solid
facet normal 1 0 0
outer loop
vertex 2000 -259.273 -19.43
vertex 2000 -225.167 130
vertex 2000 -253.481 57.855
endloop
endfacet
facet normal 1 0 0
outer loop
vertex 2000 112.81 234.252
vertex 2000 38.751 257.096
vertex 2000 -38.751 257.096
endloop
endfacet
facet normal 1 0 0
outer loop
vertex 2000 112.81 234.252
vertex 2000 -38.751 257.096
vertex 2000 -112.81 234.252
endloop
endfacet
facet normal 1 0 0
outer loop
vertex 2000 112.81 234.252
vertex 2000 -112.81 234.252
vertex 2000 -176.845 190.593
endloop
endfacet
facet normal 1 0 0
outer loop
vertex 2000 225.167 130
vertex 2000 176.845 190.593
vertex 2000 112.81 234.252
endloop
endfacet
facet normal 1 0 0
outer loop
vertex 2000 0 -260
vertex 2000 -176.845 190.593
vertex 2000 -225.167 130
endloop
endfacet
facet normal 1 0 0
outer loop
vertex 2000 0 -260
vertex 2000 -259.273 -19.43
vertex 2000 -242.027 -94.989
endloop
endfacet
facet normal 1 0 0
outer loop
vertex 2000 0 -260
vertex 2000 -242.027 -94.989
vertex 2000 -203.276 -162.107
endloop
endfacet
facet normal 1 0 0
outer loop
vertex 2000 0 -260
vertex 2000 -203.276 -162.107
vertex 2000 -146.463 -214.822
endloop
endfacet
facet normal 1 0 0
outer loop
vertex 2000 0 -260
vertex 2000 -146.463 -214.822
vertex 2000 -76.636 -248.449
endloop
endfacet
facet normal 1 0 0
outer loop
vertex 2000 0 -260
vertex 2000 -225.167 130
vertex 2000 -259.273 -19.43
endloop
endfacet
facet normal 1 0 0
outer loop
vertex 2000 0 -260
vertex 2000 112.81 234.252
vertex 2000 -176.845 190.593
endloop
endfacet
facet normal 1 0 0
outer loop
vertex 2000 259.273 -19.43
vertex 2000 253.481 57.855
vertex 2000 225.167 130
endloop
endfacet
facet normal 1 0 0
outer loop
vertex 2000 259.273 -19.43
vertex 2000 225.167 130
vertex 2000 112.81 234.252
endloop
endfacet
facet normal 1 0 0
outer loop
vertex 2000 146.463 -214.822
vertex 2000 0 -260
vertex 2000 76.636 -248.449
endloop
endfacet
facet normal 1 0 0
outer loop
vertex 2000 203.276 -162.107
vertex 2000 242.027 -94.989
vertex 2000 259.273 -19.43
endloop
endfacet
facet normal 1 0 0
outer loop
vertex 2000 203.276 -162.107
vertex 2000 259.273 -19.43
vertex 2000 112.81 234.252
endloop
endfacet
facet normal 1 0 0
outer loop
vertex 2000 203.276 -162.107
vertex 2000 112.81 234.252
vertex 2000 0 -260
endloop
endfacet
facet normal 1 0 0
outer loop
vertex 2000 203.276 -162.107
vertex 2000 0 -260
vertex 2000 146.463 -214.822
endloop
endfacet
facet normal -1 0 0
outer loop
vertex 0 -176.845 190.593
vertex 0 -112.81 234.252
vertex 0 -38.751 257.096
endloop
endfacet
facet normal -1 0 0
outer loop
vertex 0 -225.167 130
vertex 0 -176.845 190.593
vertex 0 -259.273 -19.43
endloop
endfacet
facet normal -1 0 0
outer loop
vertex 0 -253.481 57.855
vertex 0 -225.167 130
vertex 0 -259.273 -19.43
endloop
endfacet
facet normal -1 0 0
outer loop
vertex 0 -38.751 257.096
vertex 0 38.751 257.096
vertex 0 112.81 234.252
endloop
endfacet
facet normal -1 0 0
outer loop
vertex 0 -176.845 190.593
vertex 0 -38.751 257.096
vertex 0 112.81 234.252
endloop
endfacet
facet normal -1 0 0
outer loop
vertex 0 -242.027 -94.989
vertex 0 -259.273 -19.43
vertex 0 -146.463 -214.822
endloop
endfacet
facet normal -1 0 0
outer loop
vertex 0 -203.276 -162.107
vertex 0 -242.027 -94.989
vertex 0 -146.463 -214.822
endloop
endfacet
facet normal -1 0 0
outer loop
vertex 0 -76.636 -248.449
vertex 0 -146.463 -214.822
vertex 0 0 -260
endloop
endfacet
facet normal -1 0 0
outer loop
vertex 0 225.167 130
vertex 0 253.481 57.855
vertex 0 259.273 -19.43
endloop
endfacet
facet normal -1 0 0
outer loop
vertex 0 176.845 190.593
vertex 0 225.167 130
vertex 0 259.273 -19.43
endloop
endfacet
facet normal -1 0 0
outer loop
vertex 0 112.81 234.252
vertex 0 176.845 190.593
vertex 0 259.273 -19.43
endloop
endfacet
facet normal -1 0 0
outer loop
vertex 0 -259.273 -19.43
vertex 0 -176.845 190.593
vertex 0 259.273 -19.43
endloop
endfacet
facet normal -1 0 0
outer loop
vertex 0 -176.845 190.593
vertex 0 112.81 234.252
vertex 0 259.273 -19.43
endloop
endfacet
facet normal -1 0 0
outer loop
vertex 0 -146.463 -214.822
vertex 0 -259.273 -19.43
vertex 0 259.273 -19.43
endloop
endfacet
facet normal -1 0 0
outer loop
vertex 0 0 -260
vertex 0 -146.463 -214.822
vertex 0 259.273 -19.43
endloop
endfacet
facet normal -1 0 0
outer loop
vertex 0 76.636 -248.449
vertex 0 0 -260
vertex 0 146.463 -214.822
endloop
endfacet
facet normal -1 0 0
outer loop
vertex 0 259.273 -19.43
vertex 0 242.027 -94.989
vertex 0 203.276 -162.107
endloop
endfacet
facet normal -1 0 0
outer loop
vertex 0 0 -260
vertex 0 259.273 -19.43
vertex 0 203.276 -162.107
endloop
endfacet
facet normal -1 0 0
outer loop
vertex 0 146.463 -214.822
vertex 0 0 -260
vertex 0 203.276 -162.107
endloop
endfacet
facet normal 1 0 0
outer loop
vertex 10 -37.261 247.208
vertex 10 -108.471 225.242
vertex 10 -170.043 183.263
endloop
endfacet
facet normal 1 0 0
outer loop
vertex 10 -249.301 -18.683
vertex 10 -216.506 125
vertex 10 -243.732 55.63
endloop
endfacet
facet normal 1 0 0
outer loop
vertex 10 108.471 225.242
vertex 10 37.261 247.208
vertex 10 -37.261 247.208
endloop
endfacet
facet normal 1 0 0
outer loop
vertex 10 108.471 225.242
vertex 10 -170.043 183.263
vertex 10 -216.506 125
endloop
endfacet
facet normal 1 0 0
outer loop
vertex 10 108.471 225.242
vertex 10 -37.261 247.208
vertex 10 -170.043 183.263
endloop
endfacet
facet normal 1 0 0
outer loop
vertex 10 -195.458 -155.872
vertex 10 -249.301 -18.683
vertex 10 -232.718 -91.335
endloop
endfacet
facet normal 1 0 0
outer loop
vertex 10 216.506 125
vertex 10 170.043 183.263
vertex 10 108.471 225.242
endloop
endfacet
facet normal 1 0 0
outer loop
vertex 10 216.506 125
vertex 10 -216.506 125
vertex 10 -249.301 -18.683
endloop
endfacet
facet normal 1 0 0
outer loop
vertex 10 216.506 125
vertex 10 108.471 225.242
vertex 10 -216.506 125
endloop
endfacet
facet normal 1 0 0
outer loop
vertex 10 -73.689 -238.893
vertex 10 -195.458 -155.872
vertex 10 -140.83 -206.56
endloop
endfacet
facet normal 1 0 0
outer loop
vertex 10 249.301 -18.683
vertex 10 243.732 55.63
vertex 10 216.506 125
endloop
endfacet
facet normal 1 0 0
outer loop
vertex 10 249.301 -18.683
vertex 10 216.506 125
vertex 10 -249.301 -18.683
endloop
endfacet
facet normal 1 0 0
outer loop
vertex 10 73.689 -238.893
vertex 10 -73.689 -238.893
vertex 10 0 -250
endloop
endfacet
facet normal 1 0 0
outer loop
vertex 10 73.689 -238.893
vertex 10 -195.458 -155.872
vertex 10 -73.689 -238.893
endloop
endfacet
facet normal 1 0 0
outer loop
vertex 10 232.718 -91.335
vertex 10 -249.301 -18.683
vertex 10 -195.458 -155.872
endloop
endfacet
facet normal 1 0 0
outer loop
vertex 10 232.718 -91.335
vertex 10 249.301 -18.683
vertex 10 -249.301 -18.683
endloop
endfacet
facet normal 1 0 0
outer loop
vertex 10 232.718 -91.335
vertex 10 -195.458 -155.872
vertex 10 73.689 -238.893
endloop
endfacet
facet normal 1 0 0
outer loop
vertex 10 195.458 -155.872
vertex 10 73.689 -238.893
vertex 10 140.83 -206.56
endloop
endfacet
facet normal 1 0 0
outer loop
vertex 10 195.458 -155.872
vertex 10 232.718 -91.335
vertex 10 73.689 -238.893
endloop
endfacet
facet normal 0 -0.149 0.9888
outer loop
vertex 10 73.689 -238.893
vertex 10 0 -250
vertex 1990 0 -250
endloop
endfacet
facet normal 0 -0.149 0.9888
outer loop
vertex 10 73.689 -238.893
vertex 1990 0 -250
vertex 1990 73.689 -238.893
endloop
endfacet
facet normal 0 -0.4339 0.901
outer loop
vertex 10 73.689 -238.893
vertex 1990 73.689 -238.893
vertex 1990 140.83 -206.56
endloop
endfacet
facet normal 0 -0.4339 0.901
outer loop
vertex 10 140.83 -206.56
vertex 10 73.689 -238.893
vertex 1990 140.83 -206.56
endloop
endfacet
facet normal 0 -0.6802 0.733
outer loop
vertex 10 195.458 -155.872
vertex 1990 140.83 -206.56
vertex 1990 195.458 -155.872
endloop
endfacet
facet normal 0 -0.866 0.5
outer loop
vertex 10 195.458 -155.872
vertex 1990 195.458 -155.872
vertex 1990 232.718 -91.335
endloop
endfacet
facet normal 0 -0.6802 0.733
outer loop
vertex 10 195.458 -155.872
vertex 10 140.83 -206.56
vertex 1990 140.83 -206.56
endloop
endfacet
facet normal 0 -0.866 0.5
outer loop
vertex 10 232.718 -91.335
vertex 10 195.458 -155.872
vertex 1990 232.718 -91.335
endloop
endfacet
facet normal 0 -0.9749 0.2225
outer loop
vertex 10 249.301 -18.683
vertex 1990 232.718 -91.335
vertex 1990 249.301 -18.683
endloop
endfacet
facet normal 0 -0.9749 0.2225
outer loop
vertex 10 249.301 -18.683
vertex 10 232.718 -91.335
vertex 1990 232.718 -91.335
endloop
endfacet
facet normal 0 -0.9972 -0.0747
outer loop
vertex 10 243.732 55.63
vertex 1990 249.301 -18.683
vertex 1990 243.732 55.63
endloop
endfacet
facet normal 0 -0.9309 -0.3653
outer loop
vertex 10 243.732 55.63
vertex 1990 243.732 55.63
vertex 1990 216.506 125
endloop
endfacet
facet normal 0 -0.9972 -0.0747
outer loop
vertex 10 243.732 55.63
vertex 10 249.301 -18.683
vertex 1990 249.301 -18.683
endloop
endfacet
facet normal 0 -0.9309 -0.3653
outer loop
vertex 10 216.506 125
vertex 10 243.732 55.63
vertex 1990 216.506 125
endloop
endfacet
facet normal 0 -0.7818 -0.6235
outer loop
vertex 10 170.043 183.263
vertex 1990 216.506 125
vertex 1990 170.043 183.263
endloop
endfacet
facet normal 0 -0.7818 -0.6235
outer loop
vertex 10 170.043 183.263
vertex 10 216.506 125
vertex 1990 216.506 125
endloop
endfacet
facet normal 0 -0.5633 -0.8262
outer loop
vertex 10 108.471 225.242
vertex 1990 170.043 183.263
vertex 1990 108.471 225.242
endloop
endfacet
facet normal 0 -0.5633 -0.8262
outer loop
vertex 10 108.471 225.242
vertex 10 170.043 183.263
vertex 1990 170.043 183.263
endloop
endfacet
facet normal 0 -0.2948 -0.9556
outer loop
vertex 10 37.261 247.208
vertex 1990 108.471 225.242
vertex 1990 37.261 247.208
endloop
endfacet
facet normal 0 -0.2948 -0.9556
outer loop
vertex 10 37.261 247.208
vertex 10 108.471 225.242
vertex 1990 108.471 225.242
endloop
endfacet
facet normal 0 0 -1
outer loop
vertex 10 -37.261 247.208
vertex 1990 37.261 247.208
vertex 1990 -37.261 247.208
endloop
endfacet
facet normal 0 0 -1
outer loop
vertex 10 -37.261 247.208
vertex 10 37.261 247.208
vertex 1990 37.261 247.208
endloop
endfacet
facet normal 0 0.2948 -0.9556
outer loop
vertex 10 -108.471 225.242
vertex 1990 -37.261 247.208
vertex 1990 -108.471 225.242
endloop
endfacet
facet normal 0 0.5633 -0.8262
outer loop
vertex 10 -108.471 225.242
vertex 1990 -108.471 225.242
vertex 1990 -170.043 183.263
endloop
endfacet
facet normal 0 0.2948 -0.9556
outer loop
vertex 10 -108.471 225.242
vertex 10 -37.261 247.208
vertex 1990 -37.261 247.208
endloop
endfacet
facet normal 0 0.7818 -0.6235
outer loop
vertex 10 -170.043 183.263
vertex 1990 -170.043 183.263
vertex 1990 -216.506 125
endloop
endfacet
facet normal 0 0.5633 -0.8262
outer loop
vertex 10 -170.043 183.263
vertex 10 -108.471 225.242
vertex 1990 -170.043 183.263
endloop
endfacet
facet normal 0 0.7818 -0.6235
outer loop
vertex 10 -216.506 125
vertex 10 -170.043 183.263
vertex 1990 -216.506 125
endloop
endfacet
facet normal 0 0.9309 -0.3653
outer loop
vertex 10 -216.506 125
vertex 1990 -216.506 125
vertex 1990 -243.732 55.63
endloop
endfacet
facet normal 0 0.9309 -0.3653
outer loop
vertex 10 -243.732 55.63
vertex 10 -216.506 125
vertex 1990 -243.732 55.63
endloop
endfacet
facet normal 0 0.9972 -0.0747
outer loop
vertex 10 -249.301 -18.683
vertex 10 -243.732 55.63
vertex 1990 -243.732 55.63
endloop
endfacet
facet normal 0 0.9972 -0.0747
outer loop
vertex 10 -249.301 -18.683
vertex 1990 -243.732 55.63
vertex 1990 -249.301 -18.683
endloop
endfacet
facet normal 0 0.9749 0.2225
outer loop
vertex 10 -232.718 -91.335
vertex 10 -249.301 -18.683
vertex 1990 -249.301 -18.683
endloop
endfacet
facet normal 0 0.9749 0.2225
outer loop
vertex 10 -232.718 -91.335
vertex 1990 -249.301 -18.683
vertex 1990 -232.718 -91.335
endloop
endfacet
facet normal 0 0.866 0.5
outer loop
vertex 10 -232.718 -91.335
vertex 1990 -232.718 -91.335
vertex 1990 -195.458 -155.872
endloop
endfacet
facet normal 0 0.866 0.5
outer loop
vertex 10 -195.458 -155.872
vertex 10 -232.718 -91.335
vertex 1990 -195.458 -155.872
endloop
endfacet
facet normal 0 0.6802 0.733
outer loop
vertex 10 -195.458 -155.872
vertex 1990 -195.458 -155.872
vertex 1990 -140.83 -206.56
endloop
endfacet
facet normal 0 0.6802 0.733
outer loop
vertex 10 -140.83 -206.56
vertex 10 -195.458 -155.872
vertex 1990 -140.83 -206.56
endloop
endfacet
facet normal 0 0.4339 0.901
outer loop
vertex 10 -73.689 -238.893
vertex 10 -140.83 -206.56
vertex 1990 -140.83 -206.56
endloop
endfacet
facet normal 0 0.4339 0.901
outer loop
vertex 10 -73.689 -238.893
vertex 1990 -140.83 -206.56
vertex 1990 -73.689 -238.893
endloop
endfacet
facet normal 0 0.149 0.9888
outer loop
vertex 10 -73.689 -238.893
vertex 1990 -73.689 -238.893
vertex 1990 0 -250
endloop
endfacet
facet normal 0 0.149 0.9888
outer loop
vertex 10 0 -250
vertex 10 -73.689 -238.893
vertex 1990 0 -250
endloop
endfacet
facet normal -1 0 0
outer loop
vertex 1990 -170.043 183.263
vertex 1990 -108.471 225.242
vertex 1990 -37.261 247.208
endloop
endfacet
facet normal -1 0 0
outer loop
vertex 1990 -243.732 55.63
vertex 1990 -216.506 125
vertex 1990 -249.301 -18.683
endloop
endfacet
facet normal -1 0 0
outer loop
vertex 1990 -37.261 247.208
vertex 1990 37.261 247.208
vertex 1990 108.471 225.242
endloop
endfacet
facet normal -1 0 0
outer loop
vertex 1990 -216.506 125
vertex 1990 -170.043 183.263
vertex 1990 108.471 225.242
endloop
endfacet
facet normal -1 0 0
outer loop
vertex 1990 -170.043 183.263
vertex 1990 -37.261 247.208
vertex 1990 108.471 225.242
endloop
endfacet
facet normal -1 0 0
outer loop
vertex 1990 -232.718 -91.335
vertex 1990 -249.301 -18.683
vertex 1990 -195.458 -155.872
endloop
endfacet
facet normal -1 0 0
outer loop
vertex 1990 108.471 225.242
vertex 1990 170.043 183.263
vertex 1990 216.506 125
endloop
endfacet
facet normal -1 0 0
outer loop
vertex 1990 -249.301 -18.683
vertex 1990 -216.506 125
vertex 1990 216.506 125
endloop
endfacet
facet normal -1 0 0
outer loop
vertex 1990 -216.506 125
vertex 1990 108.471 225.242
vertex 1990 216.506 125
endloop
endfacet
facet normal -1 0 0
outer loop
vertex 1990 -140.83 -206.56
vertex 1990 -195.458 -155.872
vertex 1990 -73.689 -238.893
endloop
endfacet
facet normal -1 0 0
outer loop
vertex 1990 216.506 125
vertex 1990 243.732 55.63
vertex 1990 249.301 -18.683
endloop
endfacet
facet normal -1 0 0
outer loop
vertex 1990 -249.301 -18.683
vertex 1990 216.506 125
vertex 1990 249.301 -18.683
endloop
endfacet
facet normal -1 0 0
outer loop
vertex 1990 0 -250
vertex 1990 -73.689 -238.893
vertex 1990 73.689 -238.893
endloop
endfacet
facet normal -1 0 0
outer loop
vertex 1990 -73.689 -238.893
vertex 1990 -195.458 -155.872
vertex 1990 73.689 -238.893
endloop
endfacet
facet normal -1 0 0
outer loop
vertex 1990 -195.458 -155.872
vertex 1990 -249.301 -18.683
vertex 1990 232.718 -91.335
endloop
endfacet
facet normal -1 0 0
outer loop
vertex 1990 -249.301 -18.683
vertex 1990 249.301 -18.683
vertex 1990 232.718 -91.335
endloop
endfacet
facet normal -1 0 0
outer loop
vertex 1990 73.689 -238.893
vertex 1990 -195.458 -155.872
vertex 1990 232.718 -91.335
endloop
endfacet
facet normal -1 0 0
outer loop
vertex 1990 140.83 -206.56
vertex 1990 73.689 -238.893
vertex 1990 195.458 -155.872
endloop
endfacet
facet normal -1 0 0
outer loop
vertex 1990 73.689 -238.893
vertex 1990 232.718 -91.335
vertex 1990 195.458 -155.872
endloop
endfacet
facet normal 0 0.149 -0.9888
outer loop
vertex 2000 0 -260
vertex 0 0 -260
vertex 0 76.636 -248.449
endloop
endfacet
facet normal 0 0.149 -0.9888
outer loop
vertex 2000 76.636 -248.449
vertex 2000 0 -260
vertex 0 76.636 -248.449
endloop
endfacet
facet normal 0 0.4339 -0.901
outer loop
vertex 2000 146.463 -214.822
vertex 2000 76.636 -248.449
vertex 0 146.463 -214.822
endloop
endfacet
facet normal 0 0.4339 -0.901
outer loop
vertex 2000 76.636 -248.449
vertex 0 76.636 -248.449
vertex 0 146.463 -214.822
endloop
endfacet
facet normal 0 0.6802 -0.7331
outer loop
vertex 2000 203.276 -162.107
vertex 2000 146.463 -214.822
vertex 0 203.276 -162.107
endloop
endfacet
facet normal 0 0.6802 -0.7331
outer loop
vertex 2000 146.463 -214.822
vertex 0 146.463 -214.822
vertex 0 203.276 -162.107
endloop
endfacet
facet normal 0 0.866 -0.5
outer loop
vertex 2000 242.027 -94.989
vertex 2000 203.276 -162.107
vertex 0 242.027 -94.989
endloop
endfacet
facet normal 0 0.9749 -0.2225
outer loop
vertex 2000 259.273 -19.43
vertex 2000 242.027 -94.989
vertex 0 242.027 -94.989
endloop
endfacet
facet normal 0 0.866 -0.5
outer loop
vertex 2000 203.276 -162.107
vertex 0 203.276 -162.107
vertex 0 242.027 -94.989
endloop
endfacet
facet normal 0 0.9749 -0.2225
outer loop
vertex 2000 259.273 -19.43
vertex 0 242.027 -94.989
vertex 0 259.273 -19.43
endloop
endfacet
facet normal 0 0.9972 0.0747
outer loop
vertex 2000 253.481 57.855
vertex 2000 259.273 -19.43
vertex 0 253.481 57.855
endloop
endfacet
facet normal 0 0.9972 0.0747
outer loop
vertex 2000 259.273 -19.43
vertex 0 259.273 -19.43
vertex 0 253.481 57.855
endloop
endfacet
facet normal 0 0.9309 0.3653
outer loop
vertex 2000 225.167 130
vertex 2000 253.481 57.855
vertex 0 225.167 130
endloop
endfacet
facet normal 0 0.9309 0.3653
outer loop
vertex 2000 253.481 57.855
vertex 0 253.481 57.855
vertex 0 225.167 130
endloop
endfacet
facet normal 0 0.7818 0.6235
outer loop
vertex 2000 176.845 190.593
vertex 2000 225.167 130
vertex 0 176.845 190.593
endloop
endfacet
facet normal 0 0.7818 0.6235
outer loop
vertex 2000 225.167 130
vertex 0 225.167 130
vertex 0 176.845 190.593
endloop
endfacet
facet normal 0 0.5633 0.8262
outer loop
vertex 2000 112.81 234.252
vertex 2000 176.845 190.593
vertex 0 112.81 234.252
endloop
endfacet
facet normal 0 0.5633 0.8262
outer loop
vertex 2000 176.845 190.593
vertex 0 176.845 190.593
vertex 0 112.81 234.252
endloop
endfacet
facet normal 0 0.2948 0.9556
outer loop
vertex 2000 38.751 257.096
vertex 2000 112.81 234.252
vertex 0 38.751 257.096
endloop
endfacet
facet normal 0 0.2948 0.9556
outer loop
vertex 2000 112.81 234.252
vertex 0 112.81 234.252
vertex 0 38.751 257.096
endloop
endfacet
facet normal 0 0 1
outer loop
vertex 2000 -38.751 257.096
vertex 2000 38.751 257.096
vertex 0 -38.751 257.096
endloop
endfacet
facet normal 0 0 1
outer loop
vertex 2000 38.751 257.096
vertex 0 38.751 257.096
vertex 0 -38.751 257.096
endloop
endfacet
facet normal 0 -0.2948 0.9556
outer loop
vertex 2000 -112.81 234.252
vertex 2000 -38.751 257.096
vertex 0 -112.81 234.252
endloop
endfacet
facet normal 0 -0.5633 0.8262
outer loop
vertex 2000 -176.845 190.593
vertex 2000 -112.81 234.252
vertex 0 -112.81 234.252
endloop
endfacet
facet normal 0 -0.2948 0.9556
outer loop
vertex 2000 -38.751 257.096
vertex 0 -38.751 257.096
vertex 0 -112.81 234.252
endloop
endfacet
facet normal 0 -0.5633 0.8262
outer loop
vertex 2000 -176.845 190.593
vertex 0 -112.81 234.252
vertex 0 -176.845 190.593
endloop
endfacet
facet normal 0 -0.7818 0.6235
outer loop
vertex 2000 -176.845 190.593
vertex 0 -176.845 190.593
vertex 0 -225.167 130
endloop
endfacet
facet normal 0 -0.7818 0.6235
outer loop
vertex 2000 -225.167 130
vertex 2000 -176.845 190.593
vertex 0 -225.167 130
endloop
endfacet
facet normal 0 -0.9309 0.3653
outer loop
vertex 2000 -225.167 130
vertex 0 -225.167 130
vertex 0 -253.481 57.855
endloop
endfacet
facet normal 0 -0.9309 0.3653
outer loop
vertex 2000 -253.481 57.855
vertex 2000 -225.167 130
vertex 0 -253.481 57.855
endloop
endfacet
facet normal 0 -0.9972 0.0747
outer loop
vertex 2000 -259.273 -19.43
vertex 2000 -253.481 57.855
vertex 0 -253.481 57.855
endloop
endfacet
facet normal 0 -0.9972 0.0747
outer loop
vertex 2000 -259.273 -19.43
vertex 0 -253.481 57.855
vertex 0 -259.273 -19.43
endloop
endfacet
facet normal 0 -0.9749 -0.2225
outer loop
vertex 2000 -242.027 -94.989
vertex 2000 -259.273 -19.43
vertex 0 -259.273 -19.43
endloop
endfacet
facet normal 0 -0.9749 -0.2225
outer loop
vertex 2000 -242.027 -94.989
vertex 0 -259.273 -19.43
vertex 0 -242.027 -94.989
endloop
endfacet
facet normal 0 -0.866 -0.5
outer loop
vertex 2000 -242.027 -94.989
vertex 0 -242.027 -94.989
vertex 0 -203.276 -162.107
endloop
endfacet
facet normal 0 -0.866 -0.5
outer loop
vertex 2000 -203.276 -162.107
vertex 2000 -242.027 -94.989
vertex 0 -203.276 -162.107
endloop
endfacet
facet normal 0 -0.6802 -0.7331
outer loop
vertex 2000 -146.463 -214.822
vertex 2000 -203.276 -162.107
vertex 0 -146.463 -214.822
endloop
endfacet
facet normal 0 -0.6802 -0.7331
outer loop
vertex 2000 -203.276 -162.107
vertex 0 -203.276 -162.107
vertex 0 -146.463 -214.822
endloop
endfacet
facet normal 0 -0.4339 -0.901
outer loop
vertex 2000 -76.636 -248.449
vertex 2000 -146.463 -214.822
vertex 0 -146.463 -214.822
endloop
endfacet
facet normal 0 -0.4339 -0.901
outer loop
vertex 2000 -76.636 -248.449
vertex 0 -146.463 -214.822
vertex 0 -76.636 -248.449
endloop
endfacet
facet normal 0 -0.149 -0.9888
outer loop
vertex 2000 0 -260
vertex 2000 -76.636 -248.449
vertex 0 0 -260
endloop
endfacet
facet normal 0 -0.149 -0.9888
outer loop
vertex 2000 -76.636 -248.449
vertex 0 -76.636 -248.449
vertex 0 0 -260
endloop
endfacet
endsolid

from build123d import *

# Parameters (mm, degrees)
SKETCH1_R           = 260
SKETCH1_R_2         = 250
EXTRUDE_THIN1_DEPTH = 2000
BOSS_EXTRUDE1_START = 1990
SKETCH1_2_R         = 250
BOSS_EXTRUDE1_DEPTH = 10
SKETCH1_3_R         = 250
BOSS_EXTRUDE2_DEPTH = 10


with BuildPart() as part:
    # Sketch1 → Extrude-Thin1 (new body)
    with BuildSketch(Plane(origin=(0, 0, 0), x_dir=(0, 0, -1), z_dir=(1, 0, 0))):
        Circle(SKETCH1_R)
        Circle(SKETCH1_R_2, mode=Mode.SUBTRACT)
    extrude(amount=EXTRUDE_THIN1_DEPTH)

    # Sketch1<2> → Boss-Extrude1 (add)
    with BuildSketch(Plane(origin=(0, 0, 0), x_dir=(0, 0, -1), z_dir=(1, 0, 0)).offset(BOSS_EXTRUDE1_START)):
        Circle(SKETCH1_2_R)
    extrude(amount=BOSS_EXTRUDE1_DEPTH)

    # Sketch1<3> → Boss-Extrude2 (add)
    with BuildSketch(Plane(origin=(0, 0, 0), x_dir=(0, 0, -1), z_dir=(1, 0, 0))):
        Circle(SKETCH1_3_R)
    extrude(amount=BOSS_EXTRUDE2_DEPTH)


solid = part.part
